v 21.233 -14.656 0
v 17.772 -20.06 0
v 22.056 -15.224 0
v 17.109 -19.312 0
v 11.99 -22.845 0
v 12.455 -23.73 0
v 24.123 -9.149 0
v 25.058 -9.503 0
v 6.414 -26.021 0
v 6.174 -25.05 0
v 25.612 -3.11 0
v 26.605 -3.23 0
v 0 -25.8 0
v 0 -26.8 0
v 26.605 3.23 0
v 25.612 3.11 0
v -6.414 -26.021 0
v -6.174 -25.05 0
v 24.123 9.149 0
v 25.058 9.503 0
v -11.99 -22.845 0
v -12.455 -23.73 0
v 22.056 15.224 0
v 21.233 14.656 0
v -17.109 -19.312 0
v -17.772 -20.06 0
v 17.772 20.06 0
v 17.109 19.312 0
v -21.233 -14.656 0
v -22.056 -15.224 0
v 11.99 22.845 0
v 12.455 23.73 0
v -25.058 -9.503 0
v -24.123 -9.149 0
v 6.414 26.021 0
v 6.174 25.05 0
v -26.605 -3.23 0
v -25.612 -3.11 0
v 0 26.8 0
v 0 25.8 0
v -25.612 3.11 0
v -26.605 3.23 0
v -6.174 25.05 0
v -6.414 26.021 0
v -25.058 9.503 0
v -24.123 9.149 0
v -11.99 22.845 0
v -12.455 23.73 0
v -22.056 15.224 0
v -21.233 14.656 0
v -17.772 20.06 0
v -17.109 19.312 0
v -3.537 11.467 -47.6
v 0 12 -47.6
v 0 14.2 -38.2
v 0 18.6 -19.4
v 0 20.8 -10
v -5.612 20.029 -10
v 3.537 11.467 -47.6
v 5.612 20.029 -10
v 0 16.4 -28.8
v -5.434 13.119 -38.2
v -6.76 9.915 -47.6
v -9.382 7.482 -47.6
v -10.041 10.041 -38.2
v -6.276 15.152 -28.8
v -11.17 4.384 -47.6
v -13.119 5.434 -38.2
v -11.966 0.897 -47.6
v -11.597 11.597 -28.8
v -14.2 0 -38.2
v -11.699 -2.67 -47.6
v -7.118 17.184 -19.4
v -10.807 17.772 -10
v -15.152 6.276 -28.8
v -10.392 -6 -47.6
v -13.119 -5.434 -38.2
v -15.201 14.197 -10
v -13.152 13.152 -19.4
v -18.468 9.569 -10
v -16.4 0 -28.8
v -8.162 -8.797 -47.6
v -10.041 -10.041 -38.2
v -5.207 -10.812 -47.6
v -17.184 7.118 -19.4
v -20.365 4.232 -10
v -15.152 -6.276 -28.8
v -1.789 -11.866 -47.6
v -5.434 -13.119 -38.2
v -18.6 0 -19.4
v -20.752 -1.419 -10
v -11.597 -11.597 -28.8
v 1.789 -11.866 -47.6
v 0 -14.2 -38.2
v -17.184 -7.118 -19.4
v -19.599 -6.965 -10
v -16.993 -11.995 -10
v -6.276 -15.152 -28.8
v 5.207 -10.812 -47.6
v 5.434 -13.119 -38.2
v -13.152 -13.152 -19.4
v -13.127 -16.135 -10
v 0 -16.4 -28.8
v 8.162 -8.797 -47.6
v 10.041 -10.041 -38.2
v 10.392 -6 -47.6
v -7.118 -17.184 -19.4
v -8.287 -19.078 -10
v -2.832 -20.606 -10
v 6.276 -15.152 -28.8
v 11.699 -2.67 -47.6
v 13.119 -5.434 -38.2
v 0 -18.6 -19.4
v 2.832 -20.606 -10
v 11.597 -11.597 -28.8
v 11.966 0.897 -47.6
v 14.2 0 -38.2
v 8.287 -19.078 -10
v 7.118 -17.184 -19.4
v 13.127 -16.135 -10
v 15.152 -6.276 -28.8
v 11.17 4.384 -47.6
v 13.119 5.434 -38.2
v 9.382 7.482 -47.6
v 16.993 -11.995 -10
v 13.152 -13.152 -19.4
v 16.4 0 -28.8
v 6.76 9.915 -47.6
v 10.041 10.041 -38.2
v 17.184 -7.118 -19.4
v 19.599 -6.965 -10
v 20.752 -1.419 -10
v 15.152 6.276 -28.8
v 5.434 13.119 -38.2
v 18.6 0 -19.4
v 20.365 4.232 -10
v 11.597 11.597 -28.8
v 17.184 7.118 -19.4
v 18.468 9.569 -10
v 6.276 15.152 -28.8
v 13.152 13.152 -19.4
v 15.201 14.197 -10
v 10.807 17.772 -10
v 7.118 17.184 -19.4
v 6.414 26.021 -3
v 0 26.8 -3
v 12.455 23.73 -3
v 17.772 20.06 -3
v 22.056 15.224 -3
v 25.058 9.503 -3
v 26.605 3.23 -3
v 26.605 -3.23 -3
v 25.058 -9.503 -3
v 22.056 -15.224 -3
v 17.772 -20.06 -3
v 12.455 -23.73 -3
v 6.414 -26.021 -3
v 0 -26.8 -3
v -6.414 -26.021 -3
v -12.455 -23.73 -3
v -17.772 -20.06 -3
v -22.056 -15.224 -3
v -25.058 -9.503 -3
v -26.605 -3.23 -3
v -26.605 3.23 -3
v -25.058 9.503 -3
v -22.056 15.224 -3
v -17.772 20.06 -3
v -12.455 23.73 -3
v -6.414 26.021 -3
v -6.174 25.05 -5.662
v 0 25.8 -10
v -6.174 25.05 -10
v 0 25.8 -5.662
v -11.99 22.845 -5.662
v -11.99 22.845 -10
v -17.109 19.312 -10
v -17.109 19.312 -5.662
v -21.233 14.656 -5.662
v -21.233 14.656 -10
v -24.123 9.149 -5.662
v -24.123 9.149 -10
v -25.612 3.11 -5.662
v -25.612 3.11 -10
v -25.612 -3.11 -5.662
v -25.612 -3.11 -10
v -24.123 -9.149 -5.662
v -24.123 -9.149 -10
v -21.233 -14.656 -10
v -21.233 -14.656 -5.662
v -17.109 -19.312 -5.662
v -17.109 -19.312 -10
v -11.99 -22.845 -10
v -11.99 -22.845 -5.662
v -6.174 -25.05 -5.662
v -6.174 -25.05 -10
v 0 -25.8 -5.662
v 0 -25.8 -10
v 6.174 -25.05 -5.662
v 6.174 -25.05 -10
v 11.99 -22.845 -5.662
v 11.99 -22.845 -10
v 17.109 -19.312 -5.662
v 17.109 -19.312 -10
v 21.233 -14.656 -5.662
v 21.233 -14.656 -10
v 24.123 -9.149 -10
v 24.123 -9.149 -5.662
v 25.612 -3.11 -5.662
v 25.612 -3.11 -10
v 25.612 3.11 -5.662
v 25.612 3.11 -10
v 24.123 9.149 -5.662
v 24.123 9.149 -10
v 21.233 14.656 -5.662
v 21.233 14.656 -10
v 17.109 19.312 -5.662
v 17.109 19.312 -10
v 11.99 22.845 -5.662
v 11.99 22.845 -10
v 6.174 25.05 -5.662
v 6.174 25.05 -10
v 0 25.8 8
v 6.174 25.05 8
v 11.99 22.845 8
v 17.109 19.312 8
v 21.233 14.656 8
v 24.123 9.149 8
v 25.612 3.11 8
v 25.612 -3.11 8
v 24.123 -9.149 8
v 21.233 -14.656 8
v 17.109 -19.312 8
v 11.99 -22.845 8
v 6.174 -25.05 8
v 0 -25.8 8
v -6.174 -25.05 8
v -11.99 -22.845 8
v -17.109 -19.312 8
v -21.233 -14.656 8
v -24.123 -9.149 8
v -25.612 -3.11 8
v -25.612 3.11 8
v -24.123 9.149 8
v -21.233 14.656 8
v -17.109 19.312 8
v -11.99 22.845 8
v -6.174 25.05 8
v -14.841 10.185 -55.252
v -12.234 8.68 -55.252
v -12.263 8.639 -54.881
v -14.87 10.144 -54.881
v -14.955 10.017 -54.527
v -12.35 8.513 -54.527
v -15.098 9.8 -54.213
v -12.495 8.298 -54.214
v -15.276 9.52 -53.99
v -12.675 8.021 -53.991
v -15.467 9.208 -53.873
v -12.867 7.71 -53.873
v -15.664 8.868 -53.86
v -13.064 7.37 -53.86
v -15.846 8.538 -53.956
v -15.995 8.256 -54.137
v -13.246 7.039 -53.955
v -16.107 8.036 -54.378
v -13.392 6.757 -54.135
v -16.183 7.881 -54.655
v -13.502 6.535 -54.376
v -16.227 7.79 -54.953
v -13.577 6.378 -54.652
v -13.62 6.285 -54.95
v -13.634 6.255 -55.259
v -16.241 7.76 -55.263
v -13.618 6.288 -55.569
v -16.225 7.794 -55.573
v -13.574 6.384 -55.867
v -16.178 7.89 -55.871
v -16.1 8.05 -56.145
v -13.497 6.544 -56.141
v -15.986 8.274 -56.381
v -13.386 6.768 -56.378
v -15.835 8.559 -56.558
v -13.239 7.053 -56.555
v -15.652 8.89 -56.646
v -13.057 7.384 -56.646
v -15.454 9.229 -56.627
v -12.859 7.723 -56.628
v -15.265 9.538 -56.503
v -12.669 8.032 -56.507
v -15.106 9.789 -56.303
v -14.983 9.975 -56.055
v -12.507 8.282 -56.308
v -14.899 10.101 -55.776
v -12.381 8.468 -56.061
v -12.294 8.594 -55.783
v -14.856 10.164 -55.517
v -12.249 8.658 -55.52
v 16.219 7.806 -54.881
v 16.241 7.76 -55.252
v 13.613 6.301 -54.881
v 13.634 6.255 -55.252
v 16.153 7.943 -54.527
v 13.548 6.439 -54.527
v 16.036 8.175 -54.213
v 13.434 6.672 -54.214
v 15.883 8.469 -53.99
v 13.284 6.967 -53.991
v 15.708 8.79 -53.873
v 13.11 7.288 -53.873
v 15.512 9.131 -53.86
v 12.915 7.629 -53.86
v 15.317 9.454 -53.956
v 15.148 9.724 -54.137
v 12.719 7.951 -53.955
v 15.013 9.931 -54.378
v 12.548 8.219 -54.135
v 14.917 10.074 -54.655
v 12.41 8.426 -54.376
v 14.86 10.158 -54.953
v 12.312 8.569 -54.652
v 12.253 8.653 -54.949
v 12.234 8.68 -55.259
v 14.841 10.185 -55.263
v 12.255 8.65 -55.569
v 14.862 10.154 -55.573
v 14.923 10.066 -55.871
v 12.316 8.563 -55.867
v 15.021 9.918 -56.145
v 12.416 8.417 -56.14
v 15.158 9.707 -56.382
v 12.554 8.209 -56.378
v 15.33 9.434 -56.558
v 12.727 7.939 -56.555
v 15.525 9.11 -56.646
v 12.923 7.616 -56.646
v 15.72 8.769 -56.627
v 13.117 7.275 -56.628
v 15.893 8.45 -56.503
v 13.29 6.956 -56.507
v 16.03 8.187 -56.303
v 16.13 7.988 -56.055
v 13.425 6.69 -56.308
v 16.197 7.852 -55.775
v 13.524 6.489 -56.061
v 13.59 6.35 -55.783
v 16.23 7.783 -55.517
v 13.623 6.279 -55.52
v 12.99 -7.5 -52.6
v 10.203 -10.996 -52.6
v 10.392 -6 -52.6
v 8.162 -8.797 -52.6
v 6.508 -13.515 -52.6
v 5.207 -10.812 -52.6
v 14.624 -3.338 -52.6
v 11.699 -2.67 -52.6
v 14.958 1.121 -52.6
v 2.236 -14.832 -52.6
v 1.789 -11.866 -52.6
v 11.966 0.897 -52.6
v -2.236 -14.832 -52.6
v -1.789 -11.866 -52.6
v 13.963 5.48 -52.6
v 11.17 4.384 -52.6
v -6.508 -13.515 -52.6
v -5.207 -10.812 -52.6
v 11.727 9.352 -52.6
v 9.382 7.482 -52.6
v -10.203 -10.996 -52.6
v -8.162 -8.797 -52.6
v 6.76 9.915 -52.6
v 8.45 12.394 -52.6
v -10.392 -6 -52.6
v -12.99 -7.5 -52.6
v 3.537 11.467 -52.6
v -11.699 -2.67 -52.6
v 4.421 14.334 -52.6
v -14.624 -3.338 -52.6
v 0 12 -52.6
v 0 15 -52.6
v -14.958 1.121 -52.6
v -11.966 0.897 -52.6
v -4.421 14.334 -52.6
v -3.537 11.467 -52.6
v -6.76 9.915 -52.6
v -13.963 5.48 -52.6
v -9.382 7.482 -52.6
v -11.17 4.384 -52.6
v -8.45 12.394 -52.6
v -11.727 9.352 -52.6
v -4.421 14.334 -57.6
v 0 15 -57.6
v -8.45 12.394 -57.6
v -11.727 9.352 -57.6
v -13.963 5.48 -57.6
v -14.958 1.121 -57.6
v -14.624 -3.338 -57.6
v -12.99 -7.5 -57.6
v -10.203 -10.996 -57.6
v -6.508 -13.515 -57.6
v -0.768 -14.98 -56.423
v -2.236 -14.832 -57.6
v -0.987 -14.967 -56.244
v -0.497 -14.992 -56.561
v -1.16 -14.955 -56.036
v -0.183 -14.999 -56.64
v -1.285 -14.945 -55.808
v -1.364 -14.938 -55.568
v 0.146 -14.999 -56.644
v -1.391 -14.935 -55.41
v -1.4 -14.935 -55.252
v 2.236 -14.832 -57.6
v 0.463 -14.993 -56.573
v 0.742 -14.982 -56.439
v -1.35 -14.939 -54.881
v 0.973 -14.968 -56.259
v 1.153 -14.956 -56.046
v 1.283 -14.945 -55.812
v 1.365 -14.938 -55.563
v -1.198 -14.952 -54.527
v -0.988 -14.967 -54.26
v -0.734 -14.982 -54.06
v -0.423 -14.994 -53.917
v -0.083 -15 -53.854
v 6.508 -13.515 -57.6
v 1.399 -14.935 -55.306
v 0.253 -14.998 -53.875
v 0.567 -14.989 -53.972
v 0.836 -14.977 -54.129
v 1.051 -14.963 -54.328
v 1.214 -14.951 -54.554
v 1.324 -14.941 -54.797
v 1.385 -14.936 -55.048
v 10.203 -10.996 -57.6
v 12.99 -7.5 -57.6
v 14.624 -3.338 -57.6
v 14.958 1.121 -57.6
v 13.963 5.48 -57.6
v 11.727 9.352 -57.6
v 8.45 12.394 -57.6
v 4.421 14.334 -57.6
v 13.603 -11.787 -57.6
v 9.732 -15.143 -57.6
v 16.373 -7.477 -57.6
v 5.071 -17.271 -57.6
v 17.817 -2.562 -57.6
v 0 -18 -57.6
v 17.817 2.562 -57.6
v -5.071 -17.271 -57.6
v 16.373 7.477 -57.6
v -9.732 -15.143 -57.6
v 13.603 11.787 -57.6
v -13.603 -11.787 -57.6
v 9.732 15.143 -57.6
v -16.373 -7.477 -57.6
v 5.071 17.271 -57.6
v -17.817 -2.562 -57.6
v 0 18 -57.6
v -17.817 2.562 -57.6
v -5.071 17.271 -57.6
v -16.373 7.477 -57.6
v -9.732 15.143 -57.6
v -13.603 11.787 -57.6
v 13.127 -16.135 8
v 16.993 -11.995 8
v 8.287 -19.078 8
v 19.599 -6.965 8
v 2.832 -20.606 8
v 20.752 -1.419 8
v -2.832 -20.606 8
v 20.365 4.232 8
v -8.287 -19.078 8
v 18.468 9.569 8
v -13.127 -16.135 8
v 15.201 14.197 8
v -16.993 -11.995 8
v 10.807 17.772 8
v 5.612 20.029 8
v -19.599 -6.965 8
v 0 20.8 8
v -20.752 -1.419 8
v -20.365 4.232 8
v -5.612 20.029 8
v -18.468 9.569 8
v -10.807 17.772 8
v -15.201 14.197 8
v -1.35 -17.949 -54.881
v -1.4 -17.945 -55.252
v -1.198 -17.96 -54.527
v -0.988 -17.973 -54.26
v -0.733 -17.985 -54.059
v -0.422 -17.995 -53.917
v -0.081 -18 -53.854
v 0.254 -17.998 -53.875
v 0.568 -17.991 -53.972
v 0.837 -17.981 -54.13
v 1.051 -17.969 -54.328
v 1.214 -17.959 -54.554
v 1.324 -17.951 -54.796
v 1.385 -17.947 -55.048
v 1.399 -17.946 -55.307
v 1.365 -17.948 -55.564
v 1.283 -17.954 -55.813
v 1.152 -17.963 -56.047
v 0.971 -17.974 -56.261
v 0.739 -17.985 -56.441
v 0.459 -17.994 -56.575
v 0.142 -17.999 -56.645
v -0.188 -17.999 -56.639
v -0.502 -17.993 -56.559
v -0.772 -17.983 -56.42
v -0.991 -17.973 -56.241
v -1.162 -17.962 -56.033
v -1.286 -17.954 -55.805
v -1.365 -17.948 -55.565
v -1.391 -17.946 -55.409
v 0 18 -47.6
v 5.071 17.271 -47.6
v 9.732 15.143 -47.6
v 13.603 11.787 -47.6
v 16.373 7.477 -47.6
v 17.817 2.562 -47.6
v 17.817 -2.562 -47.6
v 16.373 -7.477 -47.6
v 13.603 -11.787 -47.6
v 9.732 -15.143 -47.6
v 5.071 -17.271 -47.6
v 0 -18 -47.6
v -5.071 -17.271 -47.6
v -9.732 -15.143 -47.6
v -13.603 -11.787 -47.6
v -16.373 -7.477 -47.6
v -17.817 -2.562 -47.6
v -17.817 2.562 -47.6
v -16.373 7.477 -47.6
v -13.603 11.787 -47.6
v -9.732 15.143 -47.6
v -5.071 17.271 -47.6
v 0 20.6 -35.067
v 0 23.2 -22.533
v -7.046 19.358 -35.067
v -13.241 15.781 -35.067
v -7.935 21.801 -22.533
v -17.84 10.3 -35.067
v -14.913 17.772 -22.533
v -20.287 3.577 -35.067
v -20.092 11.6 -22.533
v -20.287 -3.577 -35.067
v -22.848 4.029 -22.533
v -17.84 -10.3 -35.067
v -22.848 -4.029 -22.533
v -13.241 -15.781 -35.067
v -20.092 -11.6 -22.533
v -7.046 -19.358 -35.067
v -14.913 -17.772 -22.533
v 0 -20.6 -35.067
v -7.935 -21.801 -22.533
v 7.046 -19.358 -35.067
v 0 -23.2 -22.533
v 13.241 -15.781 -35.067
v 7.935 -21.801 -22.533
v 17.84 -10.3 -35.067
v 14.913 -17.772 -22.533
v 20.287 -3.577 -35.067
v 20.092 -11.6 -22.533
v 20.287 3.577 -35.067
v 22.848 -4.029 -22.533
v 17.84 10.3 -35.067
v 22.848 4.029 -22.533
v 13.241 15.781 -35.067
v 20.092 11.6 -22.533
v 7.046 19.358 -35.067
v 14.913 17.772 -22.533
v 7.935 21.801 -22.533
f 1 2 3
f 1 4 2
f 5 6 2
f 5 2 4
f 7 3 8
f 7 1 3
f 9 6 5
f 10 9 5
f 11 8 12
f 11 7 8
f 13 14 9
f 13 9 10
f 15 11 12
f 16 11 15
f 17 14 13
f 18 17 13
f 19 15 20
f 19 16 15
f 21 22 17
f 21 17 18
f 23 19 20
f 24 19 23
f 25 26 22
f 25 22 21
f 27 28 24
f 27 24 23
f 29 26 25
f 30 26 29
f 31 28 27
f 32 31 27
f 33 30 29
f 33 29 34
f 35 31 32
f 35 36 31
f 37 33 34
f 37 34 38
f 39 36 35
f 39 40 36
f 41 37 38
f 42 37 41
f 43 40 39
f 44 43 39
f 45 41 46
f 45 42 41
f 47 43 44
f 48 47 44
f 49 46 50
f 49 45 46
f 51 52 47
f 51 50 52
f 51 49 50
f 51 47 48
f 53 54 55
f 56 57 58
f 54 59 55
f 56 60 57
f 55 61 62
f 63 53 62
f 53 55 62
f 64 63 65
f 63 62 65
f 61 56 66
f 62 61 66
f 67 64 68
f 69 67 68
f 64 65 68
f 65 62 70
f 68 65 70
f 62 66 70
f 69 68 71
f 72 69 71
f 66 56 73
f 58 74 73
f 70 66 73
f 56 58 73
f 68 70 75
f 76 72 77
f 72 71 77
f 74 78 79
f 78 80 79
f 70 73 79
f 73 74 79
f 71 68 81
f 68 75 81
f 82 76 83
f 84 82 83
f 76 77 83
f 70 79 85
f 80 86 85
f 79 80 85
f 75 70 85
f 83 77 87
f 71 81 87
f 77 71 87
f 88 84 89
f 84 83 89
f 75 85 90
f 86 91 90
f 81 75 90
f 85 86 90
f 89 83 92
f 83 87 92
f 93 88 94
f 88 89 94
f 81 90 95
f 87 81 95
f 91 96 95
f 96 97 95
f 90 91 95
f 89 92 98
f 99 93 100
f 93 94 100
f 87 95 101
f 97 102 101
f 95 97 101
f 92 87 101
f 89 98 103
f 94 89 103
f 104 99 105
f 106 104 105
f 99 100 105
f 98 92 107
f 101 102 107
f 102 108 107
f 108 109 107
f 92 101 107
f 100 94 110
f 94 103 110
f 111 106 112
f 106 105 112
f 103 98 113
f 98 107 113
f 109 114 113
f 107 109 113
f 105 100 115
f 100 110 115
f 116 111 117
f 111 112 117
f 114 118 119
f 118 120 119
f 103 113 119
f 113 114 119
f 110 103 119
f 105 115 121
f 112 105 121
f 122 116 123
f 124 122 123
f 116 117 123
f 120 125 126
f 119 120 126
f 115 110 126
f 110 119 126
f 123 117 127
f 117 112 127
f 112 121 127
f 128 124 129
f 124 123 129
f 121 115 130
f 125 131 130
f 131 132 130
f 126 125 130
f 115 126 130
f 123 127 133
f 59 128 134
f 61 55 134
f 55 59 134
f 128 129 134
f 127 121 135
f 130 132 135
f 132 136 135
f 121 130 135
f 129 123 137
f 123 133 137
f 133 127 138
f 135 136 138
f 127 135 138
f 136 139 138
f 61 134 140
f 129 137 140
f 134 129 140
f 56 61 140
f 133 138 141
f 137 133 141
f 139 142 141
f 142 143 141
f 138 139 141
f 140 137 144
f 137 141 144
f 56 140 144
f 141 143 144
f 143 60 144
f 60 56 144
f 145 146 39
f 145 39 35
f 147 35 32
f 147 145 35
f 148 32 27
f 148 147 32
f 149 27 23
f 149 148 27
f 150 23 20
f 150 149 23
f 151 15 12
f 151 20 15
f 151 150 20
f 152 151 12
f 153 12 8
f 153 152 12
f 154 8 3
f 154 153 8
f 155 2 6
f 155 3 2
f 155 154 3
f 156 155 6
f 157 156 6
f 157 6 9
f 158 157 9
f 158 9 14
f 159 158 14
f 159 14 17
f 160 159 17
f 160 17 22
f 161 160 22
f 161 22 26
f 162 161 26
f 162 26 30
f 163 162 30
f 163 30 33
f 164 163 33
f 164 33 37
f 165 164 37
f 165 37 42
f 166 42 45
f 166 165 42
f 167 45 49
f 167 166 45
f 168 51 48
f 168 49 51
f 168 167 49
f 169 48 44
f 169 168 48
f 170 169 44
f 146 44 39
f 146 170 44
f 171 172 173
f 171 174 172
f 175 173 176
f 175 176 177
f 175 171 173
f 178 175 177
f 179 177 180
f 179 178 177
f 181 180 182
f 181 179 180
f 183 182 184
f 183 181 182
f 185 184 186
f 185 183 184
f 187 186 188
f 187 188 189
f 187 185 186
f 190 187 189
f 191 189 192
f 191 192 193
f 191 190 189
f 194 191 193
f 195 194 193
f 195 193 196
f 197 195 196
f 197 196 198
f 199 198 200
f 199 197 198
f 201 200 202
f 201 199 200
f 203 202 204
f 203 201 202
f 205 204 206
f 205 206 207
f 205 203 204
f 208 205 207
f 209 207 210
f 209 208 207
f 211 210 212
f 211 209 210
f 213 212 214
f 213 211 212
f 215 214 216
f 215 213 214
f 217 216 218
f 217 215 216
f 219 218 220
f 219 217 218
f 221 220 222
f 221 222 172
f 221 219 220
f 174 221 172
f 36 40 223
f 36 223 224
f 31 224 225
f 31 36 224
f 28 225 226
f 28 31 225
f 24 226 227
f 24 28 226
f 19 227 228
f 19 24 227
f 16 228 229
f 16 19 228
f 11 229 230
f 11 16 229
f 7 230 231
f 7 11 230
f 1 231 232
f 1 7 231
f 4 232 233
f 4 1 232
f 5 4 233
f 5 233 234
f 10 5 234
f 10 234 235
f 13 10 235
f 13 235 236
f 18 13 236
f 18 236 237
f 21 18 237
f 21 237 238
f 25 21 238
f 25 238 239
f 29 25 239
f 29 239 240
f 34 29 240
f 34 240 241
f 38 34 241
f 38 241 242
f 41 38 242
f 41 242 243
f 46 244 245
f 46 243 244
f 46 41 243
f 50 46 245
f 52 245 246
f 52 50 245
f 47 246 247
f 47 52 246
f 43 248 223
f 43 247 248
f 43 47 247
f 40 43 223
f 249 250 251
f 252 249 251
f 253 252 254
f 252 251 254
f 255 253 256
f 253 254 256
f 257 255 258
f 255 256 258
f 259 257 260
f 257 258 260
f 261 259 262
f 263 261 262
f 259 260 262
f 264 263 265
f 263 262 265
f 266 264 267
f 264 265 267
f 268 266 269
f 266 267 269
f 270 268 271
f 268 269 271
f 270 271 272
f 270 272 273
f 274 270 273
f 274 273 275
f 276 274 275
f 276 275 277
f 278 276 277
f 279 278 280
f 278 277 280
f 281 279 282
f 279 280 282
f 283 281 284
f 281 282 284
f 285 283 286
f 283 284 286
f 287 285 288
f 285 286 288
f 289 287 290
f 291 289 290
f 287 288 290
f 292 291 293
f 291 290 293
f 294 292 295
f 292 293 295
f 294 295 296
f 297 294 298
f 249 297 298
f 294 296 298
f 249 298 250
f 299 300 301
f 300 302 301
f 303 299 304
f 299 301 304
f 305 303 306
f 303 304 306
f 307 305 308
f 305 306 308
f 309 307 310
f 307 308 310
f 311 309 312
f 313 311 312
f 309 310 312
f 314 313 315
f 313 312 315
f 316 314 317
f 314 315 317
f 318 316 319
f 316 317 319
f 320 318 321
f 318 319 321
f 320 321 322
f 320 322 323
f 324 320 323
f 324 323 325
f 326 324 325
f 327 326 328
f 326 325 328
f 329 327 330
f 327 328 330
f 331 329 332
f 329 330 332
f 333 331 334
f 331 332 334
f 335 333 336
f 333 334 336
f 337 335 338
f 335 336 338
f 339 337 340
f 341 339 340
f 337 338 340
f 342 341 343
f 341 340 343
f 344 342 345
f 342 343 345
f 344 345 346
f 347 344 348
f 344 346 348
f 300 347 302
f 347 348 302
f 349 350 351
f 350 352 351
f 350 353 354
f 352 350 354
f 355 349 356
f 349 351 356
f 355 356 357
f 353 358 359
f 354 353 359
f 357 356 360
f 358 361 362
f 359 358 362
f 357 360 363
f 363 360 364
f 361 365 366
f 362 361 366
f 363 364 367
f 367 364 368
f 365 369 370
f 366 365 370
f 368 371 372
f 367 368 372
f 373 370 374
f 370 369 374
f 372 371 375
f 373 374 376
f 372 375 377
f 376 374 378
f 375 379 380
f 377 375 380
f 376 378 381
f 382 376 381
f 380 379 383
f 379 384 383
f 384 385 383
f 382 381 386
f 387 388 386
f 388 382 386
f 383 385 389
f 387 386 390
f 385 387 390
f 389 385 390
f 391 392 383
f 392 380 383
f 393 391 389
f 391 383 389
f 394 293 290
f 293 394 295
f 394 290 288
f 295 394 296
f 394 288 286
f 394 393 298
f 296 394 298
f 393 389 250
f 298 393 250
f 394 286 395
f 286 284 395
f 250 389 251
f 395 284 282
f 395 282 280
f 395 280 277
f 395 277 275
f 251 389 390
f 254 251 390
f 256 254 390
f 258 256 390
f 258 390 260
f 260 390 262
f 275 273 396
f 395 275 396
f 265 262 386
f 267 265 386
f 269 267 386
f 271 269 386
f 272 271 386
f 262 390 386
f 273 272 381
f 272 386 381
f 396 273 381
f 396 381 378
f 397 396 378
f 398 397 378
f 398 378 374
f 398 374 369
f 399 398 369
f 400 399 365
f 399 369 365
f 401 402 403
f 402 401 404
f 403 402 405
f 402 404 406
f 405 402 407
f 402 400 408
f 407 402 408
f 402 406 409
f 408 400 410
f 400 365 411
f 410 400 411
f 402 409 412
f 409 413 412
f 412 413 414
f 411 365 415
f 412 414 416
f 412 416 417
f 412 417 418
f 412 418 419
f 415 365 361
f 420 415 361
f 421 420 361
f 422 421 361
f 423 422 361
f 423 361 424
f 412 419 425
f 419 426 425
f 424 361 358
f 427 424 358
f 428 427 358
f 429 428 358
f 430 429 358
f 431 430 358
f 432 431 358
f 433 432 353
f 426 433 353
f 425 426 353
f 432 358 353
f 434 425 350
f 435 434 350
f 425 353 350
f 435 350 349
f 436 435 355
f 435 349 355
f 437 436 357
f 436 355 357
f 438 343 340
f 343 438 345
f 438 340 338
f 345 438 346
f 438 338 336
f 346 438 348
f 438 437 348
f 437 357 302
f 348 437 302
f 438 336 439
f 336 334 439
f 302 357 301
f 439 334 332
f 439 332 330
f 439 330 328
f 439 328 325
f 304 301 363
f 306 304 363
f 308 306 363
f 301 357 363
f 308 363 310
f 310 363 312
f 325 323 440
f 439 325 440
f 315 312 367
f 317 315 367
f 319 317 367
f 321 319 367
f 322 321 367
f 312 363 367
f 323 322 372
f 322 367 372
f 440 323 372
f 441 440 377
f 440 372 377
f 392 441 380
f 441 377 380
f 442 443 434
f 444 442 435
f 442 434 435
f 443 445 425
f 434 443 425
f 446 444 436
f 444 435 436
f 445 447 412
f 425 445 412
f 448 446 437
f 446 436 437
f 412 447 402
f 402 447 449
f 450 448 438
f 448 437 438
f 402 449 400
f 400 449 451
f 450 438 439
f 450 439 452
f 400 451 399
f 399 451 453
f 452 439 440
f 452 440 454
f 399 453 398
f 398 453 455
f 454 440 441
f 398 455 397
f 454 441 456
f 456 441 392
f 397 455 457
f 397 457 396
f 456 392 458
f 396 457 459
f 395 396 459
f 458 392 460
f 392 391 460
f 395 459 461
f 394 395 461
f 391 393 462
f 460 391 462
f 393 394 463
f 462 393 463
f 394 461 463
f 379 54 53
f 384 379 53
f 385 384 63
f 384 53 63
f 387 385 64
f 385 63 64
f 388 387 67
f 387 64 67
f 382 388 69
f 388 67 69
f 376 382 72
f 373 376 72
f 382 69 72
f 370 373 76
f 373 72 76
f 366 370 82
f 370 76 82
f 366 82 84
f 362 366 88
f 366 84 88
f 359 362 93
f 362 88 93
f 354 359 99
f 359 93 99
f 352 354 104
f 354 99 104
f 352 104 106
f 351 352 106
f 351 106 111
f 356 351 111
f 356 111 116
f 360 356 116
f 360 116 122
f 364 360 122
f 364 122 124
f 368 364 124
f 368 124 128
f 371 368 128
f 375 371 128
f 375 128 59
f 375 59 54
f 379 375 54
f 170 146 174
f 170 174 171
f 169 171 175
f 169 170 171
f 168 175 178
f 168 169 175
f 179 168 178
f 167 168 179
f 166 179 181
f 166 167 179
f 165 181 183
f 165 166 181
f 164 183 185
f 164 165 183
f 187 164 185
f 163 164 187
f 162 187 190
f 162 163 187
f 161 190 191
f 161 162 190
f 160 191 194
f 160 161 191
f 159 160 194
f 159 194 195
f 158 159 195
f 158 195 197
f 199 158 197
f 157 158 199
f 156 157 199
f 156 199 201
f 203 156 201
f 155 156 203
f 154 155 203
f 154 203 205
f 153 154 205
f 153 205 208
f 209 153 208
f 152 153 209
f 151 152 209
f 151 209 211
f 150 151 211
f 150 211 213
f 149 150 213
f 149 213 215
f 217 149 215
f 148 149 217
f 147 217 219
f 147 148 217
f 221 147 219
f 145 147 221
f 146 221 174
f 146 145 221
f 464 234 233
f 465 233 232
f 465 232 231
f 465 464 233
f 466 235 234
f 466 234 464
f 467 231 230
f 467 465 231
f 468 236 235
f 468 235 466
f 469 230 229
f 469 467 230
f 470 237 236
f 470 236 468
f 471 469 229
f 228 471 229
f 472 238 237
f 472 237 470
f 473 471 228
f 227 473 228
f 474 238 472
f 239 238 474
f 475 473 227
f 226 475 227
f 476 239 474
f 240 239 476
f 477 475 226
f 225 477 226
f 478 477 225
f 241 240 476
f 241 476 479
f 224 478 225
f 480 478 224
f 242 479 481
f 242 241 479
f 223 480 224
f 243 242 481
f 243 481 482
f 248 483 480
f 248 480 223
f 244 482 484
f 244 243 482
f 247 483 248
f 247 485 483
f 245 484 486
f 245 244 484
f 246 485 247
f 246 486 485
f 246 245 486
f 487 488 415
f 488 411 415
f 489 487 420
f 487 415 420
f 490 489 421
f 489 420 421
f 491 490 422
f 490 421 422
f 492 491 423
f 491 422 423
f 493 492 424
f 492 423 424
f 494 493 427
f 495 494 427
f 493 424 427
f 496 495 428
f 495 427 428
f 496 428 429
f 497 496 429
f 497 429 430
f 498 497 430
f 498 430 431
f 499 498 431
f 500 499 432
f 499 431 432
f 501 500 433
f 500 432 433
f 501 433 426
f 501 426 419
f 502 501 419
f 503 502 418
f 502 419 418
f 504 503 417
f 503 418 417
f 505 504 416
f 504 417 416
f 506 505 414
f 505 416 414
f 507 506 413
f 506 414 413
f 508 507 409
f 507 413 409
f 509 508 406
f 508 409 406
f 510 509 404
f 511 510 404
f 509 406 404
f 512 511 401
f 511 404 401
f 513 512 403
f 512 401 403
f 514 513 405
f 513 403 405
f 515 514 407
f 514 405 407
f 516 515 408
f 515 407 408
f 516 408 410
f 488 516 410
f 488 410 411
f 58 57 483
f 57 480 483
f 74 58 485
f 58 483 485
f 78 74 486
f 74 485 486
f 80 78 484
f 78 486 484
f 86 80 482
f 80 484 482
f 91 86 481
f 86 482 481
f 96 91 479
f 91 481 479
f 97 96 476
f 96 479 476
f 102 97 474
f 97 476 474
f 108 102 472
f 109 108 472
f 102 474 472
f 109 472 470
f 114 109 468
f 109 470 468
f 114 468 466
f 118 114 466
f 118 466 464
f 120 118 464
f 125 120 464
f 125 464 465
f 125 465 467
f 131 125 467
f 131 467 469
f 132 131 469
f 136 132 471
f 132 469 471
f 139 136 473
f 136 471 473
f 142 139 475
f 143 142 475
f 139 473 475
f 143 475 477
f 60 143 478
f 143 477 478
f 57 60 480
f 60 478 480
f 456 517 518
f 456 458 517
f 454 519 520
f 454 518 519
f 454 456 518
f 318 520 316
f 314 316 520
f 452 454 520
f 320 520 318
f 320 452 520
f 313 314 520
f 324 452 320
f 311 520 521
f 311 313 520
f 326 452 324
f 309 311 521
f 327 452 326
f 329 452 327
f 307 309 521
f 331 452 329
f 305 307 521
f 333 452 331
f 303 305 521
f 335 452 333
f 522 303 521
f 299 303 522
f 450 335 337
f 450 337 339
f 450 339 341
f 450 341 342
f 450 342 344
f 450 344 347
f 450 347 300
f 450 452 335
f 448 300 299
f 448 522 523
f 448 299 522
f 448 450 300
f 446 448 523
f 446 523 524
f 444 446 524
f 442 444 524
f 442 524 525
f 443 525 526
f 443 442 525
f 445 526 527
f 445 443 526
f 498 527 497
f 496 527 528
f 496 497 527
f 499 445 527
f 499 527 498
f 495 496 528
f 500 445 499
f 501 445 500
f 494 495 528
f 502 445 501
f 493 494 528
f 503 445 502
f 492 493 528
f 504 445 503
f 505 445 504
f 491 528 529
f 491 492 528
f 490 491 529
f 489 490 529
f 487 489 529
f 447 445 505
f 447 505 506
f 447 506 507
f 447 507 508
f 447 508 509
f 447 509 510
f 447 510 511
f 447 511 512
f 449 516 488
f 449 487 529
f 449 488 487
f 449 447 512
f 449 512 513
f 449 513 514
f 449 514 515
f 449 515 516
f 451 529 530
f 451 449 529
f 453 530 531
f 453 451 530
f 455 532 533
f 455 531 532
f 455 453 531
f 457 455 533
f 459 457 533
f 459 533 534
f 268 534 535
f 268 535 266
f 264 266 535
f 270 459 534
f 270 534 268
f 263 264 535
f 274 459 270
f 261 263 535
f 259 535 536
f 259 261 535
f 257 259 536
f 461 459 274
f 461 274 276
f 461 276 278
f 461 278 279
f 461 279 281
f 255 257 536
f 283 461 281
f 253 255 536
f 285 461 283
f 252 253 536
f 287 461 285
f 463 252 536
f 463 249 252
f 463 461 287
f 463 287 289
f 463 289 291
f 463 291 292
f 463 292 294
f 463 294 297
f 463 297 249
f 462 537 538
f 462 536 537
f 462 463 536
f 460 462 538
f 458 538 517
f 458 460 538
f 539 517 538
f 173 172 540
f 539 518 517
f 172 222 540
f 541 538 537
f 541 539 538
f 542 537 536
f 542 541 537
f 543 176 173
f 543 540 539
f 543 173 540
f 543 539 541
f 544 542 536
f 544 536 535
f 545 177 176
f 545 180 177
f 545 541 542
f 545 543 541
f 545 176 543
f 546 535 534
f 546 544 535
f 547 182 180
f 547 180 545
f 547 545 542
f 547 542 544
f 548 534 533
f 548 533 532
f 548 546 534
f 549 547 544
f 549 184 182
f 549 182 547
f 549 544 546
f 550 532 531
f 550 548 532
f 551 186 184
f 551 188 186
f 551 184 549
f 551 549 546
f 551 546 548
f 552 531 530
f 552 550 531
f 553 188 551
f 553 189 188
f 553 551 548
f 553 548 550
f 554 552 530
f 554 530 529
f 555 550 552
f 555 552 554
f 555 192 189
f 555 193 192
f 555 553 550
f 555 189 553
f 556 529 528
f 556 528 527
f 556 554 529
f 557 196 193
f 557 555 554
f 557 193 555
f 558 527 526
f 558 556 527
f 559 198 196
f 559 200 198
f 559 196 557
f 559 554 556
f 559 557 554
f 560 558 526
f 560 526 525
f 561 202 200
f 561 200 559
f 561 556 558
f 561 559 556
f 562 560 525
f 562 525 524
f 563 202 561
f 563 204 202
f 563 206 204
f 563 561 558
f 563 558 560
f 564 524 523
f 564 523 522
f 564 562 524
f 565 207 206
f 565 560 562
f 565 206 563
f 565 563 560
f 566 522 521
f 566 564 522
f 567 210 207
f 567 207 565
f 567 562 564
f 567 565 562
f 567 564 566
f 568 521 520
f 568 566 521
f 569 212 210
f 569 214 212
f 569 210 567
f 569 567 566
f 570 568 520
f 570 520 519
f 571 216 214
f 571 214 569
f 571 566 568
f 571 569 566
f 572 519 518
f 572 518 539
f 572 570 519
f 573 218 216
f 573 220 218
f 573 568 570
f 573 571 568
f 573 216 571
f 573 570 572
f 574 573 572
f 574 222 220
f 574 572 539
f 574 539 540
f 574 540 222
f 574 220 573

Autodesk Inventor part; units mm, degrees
ref_plane "YZ Plane" through (0, 0, 0) normal (1, 0, 0) x (0, 1, 0)
ref_plane "XZ Plane" through (0, 0, 0) normal (0, 1, 0) x (-1, 0, 0)
ref_plane "XY Plane" through (0, 0, 0) normal (0, 0, 1) x (1, 0, 0)
sketch "Skizze1" plane through (0, 0, 0) normal (1, 0, 0) x (0, 1, 0)
  line L0 (25.8, 0) -> (20.8, 0)
  line L1 (20.8, 0) -> (20.8, -10)
  line L2 (20.8, -10) -> (25.8, -10)
  line L3 (25.8, -10) -> (25.8, 0)
  line L4 (18, -57.6) -> (12, -57.6)
  line L5 (12, -57.6) -> (12, -47.6)
  line L6 (12, -47.6) -> (18, -47.6)
  line L7 (18, -47.6) -> (18, -57.6)
  line L8 (25.8, -10) -> (18, -47.6)
  line L9 (20.8, -10) -> (12, -47.6)
  line L10 (12, -57.6) -> (15, -57.6)
  line L11 (15, -57.6) -> (15, -52.6)
  line L12 (15, -52.6) -> (12, -52.6)
  line L13 (12, -52.6) -> (12, -57.6)
  line L14 (0, -70.72) -> (0, 21.12) projected
  line L15 (25.8, 0) -> (20.8, 0)
  line L16 (20.8, 0) -> (20.8, 8)
  line L17 (20.8, 8) -> (25.8, 8)
  line L18 (25.8, 8) -> (25.8, 0)
  line L19 (25.8, 0) -> (26.8, 0)
  line L20 (26.8, 0) -> (26.8, -3)
  line L21 (26.8, -3) -> (25.8, -3)
  line L22 (25.8, -3) -> (25.8, 0)
  line L23 (26.8, -3) -> (25.8, -5.6618)
  point P0 (0, 0)
  point P1 (15, -57.6)
  point P2 (15, -47.6)
  point P3 (15, -55.1)
  dimension "d0" = 5
  dimension "d1" = 10
  dimension "d2" = 25.8
  dimension "d3" = 57.6
  dimension "d4" = 10
  dimension "d5" = 6
  dimension "d6" = 12
  dimension "d7" = 5
  dimension "d8" = 15
  dimension "d16" = 8
  dimension "d17" = 1
  dimension "d18" = 3
revolve "Umdrehung1" add sketch "Skizze1" angle 360 about axis through (0, 0, -10) along (0, 0, 1) contours L3 L2 L1 L0 | L19 L20 L21 L3 | L0 L16 L17 L18 | L21 L23 L3 | L2 L8 L6 L9 | L6 L7 L4 L11 L12 L5
sketch "Skizze2" plane through (0, 0, 0) normal (0, 1, 0) x (-1, 0, 0)
  circle A0 centre (0, -55.252) radius 1.4
  point P0 (0, 0)
  dimension "d10" = 2.8
extrude "Extrusion1" cut sketch "Skizze2" against normal through all
pattern_circular "Runde Anordnung1" count 3 over 360 about axis through (0, 0, -52.6) along (0, 0, 1) of "Extrusion1"
properties part number "00_Zeiss_Daheng_Adapter"
